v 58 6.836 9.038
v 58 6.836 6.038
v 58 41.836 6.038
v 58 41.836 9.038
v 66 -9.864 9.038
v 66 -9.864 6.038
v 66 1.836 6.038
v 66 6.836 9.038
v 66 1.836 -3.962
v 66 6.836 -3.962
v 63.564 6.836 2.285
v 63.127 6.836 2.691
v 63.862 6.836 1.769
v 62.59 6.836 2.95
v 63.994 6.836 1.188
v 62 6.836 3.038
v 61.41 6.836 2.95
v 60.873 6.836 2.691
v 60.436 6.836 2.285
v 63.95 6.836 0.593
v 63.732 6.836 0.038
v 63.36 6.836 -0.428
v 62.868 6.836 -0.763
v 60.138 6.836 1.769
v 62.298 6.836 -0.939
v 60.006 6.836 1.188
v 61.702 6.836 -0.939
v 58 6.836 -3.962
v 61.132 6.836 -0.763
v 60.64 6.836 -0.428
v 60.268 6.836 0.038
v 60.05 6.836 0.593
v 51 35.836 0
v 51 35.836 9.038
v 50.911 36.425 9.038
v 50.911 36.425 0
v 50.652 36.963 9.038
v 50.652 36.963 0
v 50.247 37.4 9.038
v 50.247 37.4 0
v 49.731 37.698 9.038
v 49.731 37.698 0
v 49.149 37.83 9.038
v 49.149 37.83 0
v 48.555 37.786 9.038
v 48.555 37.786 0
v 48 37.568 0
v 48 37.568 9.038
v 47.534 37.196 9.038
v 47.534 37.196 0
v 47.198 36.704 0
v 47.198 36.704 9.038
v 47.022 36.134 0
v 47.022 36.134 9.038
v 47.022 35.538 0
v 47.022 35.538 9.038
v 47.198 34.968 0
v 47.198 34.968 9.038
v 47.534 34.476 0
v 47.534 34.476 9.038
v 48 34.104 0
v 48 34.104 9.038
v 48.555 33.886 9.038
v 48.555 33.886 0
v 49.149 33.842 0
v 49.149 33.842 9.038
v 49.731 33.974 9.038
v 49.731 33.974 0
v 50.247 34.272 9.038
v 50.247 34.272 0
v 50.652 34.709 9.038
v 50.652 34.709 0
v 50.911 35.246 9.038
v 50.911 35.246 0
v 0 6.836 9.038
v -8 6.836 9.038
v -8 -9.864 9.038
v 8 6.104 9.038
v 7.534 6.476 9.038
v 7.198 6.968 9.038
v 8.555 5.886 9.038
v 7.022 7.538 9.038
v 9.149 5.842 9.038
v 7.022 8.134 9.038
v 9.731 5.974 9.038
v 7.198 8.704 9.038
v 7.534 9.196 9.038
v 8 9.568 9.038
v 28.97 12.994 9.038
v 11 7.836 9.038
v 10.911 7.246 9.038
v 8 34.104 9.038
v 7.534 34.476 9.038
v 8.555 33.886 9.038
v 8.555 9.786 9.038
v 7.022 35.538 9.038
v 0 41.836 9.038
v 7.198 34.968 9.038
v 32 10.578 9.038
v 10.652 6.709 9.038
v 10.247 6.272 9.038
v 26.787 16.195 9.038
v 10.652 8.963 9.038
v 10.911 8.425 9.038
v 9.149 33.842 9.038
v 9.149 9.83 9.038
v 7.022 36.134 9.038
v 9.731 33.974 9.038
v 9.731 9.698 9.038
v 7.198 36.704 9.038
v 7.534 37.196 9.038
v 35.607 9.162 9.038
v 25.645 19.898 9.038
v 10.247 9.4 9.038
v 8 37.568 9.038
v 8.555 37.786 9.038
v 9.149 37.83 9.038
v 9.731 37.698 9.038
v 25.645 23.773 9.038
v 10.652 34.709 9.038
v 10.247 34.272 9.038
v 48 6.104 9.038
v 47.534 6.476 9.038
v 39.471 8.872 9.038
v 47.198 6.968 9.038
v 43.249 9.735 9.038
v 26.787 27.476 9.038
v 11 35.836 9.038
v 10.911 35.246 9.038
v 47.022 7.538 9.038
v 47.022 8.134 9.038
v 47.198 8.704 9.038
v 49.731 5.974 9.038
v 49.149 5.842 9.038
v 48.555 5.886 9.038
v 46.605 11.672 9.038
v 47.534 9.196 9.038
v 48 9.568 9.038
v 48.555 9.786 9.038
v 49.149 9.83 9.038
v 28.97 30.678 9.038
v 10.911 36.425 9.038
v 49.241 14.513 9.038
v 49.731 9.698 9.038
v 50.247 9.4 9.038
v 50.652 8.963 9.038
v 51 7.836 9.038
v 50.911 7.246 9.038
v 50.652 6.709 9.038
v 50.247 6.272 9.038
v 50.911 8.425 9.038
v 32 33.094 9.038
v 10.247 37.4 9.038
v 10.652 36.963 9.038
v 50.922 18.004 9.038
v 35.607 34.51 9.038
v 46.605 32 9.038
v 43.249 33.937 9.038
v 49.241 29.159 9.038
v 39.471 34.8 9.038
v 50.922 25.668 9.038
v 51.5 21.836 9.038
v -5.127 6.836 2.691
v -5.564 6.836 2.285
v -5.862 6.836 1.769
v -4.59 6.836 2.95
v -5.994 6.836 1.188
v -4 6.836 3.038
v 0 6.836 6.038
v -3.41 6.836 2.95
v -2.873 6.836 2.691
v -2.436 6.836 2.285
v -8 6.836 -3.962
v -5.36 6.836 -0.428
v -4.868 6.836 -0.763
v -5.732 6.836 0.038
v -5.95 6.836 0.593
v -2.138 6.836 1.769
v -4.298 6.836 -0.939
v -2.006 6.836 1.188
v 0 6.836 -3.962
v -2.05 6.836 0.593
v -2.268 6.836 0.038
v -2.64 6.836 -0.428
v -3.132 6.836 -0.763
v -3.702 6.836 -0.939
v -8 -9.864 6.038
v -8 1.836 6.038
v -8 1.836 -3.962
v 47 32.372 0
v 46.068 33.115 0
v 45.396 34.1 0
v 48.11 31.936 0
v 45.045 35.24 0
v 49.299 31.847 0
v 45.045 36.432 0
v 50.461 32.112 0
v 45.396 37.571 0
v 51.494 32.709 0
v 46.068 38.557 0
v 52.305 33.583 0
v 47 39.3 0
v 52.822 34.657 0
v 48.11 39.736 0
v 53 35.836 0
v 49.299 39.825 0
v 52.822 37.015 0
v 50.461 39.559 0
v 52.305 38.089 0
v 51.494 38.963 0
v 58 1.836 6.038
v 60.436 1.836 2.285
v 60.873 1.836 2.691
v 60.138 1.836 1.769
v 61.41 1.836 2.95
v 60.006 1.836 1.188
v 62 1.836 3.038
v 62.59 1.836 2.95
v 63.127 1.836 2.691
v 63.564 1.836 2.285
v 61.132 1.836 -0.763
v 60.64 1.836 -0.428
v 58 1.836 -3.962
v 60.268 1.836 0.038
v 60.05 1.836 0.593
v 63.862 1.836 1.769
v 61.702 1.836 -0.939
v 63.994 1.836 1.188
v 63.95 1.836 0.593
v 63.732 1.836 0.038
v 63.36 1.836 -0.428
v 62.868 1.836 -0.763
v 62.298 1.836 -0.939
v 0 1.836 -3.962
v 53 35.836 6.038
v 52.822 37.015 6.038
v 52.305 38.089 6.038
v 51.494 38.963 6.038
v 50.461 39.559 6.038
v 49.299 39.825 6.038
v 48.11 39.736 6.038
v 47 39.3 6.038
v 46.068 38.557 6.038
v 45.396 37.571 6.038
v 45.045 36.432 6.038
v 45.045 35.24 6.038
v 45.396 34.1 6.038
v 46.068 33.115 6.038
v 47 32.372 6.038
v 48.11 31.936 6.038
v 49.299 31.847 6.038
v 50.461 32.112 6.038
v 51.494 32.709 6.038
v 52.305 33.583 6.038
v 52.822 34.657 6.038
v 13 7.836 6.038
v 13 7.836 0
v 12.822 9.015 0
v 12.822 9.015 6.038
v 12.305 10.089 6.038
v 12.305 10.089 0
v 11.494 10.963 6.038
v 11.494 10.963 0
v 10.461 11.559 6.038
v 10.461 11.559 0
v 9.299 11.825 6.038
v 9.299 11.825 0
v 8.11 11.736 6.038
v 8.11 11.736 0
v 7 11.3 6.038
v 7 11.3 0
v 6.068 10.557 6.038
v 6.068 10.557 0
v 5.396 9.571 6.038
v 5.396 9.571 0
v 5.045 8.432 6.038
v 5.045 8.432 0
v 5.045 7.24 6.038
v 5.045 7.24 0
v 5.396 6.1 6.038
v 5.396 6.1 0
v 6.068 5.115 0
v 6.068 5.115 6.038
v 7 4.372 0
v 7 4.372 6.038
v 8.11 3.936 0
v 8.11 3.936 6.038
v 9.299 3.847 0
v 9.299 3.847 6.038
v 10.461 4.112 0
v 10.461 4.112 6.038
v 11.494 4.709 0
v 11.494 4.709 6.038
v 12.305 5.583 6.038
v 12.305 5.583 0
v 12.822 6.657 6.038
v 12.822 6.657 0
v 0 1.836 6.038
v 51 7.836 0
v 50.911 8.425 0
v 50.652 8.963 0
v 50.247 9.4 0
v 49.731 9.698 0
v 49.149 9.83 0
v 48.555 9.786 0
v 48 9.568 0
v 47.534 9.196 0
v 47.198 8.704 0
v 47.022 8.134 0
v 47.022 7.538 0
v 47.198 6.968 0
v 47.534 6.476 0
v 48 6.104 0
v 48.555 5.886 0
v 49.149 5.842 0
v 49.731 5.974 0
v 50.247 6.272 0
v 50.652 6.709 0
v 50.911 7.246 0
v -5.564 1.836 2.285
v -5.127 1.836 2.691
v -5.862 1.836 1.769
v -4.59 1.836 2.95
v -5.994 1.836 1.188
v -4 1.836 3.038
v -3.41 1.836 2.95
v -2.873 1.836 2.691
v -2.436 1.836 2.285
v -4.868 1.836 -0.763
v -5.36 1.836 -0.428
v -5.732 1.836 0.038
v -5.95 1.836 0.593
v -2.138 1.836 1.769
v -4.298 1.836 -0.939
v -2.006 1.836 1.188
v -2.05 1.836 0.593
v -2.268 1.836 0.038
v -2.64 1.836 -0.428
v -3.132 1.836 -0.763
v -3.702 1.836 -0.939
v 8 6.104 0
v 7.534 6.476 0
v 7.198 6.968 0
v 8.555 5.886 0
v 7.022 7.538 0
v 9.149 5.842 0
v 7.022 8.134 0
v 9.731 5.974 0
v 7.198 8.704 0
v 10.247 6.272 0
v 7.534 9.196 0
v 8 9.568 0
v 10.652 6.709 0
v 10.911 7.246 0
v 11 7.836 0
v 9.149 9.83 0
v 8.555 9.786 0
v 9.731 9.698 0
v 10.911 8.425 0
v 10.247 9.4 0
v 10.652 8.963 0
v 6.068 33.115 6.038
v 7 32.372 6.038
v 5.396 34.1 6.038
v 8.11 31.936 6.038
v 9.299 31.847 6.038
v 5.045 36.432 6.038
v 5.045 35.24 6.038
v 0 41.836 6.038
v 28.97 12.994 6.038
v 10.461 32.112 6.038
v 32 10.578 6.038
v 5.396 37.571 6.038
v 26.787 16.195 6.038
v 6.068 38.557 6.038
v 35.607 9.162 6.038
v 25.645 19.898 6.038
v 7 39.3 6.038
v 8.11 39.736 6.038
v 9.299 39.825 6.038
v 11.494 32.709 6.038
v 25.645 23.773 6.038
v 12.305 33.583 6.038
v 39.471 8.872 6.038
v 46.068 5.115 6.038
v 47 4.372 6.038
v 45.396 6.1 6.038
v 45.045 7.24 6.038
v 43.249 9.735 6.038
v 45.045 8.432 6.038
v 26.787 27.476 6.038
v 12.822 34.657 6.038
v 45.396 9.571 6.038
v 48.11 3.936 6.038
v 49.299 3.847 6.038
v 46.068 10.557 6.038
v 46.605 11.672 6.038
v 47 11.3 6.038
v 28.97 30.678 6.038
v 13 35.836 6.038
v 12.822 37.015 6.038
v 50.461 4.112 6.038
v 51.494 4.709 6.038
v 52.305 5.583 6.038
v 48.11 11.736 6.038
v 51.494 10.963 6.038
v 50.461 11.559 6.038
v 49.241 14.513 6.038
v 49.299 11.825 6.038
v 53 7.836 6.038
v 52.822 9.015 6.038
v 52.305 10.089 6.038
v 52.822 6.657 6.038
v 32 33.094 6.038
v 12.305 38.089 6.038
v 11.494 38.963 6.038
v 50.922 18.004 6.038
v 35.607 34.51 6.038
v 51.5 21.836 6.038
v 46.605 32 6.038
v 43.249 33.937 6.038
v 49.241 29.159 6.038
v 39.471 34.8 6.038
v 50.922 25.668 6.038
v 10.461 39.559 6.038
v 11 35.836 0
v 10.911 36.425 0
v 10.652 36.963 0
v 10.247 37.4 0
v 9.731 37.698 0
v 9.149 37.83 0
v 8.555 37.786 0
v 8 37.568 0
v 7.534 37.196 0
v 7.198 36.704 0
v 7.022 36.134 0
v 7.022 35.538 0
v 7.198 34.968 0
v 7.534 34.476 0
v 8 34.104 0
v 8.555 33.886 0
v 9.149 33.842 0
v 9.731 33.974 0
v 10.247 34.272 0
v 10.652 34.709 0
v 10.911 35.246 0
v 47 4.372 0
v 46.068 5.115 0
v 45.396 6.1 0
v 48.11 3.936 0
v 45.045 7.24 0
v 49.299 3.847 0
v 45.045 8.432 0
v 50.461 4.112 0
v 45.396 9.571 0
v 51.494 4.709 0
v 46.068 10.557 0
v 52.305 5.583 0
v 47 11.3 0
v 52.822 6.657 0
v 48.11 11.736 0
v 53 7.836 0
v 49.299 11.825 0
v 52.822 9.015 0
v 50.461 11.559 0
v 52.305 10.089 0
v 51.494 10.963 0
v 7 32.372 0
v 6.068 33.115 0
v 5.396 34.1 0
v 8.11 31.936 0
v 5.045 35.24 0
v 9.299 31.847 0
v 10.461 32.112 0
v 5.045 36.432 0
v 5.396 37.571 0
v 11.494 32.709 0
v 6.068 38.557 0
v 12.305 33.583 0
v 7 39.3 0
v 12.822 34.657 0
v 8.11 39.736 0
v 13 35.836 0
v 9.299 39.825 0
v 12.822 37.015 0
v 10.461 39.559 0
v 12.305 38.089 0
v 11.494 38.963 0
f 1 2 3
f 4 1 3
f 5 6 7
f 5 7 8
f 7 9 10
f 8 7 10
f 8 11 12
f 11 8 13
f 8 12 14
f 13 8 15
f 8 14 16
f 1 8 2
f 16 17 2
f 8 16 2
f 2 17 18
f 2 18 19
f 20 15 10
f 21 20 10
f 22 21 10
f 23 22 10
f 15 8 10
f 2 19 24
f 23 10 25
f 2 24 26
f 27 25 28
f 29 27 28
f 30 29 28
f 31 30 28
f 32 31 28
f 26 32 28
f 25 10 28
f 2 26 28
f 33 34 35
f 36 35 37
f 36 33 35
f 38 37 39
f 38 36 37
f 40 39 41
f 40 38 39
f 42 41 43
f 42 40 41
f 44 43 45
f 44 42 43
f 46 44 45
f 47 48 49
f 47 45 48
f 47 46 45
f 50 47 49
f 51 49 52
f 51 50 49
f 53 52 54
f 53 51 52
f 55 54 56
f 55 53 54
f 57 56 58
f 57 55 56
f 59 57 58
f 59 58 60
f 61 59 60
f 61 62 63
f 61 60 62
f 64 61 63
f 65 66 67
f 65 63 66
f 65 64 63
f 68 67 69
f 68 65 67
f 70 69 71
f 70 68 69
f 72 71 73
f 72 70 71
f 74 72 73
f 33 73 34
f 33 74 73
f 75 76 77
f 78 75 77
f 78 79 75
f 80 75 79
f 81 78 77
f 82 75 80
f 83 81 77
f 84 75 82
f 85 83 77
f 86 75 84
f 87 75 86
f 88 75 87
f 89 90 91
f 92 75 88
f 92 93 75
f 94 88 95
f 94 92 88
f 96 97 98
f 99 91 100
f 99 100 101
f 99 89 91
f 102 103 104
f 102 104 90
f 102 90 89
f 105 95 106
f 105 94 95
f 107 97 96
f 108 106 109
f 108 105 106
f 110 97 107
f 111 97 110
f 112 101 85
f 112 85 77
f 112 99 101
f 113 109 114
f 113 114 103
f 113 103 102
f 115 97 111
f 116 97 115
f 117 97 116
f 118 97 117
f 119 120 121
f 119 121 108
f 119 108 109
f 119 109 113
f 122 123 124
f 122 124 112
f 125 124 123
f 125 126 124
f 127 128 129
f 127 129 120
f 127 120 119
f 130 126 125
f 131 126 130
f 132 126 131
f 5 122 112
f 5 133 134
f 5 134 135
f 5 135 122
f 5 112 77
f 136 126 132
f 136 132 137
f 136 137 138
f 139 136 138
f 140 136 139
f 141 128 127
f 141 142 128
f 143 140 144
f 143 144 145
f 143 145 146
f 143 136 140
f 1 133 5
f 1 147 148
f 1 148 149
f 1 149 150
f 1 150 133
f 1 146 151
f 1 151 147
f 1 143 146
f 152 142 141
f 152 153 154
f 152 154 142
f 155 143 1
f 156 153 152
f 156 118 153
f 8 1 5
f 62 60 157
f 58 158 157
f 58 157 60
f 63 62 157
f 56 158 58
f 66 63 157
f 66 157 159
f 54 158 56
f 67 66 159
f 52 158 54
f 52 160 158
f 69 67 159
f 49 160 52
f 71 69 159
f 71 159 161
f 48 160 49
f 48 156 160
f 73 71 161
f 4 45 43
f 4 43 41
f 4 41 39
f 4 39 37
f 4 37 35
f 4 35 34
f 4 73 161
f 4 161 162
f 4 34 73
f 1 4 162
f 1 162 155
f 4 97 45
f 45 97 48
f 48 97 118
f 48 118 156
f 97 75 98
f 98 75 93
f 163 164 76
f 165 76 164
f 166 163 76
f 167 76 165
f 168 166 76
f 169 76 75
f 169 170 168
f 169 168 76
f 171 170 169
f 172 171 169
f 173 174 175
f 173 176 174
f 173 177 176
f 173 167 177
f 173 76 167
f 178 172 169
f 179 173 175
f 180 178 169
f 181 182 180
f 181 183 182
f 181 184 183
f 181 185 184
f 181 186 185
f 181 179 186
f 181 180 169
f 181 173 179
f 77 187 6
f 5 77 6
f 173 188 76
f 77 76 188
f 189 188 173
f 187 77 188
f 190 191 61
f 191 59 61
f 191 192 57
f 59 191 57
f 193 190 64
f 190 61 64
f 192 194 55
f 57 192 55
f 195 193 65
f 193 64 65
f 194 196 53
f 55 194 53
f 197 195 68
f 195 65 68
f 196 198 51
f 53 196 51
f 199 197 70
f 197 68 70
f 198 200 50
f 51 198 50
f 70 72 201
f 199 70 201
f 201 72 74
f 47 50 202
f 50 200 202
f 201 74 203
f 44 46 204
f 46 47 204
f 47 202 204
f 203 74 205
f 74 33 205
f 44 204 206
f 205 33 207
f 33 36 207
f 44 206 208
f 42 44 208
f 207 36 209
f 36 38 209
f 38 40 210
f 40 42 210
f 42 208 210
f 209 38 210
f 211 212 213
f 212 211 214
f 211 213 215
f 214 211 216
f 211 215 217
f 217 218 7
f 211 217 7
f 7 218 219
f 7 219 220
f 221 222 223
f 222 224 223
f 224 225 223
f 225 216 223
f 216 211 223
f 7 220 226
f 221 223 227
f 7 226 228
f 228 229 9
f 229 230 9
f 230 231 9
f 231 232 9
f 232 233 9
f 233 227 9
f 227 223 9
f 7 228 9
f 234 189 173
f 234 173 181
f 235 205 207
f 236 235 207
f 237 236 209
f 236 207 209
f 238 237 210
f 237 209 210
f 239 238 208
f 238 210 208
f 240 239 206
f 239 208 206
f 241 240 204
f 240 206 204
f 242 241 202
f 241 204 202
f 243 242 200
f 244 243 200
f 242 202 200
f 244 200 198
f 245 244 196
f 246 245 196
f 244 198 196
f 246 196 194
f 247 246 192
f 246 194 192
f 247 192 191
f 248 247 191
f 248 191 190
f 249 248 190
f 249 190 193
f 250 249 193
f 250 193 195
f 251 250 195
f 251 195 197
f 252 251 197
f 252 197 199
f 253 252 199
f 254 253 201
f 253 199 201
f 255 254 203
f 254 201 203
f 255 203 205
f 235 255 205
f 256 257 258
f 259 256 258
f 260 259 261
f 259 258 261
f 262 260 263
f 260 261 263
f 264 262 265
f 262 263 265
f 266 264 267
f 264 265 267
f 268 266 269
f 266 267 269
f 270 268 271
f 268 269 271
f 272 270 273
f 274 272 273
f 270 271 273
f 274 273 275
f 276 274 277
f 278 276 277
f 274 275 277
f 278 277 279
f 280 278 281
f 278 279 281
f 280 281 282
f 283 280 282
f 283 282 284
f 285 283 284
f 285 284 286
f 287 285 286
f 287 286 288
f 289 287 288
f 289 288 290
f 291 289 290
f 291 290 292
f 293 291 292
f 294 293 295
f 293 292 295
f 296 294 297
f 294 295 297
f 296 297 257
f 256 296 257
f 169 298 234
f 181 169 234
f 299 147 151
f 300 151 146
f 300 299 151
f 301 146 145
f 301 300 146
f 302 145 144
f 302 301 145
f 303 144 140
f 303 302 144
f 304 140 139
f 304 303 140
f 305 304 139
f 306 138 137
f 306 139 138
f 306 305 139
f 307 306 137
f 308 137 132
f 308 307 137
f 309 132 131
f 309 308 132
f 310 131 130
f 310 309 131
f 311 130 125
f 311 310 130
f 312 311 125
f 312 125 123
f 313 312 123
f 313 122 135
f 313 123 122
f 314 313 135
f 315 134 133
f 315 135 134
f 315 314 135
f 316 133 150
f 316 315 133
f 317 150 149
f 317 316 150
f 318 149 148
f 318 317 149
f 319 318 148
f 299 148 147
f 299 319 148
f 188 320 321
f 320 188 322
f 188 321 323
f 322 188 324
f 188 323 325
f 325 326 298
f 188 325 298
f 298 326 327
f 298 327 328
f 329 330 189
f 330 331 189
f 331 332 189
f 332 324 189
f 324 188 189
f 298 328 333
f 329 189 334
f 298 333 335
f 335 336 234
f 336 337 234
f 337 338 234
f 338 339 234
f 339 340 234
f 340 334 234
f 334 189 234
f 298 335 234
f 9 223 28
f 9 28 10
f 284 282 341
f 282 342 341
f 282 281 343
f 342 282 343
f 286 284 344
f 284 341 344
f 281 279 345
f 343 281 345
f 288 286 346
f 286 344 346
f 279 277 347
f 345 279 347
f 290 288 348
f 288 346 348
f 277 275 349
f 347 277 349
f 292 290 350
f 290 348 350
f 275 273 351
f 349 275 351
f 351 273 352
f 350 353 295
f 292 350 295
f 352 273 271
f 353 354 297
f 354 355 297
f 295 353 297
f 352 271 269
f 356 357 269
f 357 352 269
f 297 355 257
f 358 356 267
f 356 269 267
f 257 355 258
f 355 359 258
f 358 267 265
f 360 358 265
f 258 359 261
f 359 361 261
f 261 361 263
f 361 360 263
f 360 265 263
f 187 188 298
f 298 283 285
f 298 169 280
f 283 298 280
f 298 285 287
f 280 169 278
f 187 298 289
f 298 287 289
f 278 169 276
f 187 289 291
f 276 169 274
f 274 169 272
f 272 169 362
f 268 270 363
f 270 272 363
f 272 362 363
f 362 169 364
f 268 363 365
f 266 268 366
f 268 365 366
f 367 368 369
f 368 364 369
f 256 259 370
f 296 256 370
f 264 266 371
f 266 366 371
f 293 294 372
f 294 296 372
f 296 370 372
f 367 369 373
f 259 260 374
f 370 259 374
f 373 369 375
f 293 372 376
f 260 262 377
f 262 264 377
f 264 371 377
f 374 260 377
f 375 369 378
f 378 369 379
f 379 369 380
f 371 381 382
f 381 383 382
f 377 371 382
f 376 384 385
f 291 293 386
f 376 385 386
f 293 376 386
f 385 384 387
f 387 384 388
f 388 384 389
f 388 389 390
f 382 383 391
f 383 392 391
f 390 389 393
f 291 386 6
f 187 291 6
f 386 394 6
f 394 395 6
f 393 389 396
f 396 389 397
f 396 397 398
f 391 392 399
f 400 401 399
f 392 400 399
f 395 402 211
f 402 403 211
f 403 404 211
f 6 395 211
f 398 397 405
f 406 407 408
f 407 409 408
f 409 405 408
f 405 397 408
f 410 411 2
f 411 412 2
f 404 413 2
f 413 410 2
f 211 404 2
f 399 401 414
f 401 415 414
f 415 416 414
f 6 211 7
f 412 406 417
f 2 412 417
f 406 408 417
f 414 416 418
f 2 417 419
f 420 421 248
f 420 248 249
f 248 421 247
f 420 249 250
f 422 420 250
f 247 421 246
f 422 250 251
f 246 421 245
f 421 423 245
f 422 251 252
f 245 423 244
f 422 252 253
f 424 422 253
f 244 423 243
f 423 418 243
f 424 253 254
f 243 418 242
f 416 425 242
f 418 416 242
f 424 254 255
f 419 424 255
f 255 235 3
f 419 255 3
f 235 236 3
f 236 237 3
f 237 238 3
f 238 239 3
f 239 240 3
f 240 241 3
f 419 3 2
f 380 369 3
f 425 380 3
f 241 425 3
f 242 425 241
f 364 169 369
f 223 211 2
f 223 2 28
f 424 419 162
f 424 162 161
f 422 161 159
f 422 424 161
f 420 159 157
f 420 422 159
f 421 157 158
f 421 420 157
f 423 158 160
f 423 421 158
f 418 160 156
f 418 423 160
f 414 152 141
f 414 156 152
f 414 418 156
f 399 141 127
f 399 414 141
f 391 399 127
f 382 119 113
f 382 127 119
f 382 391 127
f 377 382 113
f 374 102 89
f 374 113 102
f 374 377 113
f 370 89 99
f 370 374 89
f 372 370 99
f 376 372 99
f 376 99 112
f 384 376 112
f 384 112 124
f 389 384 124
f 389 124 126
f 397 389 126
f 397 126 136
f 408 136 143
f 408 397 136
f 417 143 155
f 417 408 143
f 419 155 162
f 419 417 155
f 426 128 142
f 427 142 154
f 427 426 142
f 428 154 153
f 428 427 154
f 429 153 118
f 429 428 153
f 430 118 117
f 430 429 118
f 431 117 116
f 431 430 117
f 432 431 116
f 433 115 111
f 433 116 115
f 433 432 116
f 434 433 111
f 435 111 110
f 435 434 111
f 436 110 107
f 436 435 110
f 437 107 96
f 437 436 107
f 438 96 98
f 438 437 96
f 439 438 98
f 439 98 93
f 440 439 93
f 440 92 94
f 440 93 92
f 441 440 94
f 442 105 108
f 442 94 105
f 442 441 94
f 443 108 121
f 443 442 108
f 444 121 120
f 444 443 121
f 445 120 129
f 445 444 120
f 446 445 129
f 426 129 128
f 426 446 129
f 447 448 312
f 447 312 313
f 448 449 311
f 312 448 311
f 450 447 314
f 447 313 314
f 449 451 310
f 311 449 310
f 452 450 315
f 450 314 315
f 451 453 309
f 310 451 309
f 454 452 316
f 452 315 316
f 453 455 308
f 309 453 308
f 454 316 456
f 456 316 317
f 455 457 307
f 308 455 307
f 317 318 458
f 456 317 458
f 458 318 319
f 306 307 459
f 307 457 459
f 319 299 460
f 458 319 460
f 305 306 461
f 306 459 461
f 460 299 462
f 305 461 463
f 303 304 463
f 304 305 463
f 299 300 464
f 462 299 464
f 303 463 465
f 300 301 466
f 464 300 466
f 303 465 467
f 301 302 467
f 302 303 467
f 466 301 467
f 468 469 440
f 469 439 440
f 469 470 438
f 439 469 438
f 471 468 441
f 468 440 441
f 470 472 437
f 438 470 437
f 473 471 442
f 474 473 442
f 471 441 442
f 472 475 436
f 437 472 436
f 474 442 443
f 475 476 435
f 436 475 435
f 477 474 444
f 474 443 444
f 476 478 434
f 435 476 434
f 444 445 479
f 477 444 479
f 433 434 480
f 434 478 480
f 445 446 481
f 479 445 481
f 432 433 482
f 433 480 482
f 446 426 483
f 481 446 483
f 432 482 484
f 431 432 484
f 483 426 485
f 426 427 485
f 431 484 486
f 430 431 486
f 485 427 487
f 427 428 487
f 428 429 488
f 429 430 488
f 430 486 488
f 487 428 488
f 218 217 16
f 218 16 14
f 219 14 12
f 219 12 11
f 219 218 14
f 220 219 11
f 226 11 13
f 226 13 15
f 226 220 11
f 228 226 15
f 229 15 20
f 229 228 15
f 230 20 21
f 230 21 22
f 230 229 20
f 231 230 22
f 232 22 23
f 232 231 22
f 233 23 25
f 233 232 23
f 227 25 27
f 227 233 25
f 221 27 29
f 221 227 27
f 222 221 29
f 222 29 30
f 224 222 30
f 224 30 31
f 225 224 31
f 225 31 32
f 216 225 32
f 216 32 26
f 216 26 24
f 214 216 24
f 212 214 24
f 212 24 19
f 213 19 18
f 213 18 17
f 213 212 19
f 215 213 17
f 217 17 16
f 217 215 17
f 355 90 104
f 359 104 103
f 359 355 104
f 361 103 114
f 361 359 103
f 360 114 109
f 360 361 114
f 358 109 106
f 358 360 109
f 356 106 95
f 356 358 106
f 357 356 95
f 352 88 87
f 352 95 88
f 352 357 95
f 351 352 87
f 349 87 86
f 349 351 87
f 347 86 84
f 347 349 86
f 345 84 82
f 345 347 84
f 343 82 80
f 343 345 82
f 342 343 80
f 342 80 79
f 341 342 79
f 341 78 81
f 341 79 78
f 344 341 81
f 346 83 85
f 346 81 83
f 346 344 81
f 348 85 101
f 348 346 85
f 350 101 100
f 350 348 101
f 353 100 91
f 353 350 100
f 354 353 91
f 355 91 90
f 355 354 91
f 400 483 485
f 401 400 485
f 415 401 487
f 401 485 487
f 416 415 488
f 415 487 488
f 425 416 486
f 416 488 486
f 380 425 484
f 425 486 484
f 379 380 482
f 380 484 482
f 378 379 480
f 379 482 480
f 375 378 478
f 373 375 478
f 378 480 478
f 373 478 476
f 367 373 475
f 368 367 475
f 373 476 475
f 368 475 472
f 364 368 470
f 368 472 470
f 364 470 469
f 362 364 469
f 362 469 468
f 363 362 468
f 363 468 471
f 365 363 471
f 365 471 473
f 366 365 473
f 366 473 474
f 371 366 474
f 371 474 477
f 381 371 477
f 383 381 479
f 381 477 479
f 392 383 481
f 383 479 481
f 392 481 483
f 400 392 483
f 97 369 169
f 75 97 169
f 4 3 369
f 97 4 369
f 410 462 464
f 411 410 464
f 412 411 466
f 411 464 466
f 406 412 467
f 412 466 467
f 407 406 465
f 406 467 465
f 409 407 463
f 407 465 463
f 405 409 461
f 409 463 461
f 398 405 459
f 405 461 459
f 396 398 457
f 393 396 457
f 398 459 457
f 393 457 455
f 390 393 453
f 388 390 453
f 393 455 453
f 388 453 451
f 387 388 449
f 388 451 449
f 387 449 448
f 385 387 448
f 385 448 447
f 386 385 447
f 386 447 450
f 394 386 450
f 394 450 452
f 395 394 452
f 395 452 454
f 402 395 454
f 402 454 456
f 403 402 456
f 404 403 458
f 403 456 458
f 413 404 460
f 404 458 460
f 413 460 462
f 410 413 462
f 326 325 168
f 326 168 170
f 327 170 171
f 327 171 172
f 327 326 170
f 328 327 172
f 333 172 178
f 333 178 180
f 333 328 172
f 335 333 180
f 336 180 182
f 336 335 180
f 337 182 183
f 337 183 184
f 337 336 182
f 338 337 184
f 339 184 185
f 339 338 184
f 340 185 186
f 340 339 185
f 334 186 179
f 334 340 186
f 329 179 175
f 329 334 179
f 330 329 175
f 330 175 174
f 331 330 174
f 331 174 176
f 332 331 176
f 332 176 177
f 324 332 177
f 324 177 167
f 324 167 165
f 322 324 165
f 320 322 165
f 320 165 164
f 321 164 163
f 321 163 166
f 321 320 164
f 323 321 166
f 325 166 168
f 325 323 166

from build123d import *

# Parameters (mm, degrees)
SKETCH1_R             = 4
SKETCH1_R_2           = 2
BOSS_EXTRUDE2_DEPTH   = 6.038447986
BOSS_EXTRUDE2_2_DEPTH = 6.038447986
BOSS_EXTRUDE2_3_DEPTH = 6.038447986
BOSS_EXTRUDE2_4_DEPTH = 6.038447986
BOSS_EXTRUDE4_DEPTH   = 3
SKETCH2_W             = 8
SKETCH2_H             = 10
SKETCH2_R             = 2
BOSS_EXTRUDE3_DEPTH   = 5
SKETCH1_4_R           = 2
SKETCH1_4_R_2         = 13
CUT_EXTRUDE1_DEPTH    = 10


with BuildPart() as part:
    # Sketch1 → Boss-Extrude2 (new body)
    with BuildSketch(Plane.XY):
        with Locations((49, 35.83595021)):
            Circle(SKETCH1_R)
        with Locations((49, 35.83595021)):
            Circle(SKETCH1_R_2, mode=Mode.SUBTRACT)
    extrude(amount=BOSS_EXTRUDE2_DEPTH)



with BuildPart() as body_2:
    # Sketch1 → Boss-Extrude2 2 (new body)
    with BuildSketch(Plane.XY):
        with Locations((49, 7.83595021)):
            Circle(SKETCH1_R)
        with Locations((49, 7.83595021)):
            Circle(SKETCH1_R_2, mode=Mode.SUBTRACT)
    extrude(amount=BOSS_EXTRUDE2_2_DEPTH)


with BuildPart() as body_3:
    # Sketch1 → Boss-Extrude2 3 (new body)
    with BuildSketch(Plane.XY):
        with Locations((9, 7.83595021)):
            Circle(SKETCH1_R)
        with Locations((9, 7.83595021)):
            Circle(SKETCH1_R_2, mode=Mode.SUBTRACT)
    extrude(amount=BOSS_EXTRUDE2_3_DEPTH)


with BuildPart() as body_4:
    # Sketch1 → Boss-Extrude2 4 (new body)
    with BuildSketch(Plane.XY):
        with Locations((9, 35.83595021)):
            Circle(SKETCH1_R)
        with Locations((9, 35.83595021)):
            Circle(SKETCH1_R_2, mode=Mode.SUBTRACT)
    extrude(amount=BOSS_EXTRUDE2_4_DEPTH)


with BuildPart() as part_1:
    add(part.part)

    add(body_2.part)  # Boss-Extrude4 merges body 2

    add(body_3.part)  # Boss-Extrude4 merges body 3

    add(body_4.part)  # Boss-Extrude4 merges body 4
    # Sketch3 → Boss-Extrude4 (add)
    with BuildSketch(Plane.XY.offset(6.038447986)):
        Polygon((-8, 6.83595021), (-8, -9.86404979), (66, -9.86404979), (66, 6.83595021), (58, 6.83595021), (58, 41.83595021), (0, 41.83595021), (0, 6.83595021), align=None)
    extrude(amount=BOSS_EXTRUDE4_DEPTH)

    # Sketch2 → Boss-Extrude3 (add)
    # profile 1 of 2: a face of its own
    with BuildSketch(Plane(origin=(0, 1.83595021, 0), x_dir=(1, 0, 0), z_dir=(0, 1, 0))):
        with Locations((-4, -1.038447986)):
            Rectangle(SKETCH2_W, SKETCH2_H)
        with Locations(Location((-4, -1.038447986, 0), (0, 0, 270))):
            Circle(SKETCH2_R, mode=Mode.SUBTRACT)
    # profile 2 of 2: a face of its own
    with BuildSketch(Plane(origin=(0, 1.83595021, 0), x_dir=(1, 0, 0), z_dir=(0, 1, 0))):
        with Locations((62, -1.038447986)):
            Rectangle(SKETCH2_W, SKETCH2_H)
        with Locations(Location((62, -1.038447986, 0), (0, 0, 270))):
            Circle(SKETCH2_R, mode=Mode.SUBTRACT)
    extrude(amount=BOSS_EXTRUDE3_DEPTH)

    # Sketch1<4> → Cut-Extrude1 (cut)
    with BuildSketch(Plane.XY):
        with Locations((9, 35.83595021)):
            Circle(SKETCH1_4_R)
        with Locations((9, 7.83595021)):
            Circle(SKETCH1_4_R)
        with Locations((49, 35.83595021)):
            Circle(SKETCH1_4_R)
        with Locations((38.5, 21.83595021)):
            Circle(SKETCH1_4_R_2)
        with Locations((49, 7.83595021)):
            Circle(SKETCH1_4_R)
    extrude(amount=CUT_EXTRUDE1_DEPTH, mode=Mode.SUBTRACT)


solid = part_1.part
